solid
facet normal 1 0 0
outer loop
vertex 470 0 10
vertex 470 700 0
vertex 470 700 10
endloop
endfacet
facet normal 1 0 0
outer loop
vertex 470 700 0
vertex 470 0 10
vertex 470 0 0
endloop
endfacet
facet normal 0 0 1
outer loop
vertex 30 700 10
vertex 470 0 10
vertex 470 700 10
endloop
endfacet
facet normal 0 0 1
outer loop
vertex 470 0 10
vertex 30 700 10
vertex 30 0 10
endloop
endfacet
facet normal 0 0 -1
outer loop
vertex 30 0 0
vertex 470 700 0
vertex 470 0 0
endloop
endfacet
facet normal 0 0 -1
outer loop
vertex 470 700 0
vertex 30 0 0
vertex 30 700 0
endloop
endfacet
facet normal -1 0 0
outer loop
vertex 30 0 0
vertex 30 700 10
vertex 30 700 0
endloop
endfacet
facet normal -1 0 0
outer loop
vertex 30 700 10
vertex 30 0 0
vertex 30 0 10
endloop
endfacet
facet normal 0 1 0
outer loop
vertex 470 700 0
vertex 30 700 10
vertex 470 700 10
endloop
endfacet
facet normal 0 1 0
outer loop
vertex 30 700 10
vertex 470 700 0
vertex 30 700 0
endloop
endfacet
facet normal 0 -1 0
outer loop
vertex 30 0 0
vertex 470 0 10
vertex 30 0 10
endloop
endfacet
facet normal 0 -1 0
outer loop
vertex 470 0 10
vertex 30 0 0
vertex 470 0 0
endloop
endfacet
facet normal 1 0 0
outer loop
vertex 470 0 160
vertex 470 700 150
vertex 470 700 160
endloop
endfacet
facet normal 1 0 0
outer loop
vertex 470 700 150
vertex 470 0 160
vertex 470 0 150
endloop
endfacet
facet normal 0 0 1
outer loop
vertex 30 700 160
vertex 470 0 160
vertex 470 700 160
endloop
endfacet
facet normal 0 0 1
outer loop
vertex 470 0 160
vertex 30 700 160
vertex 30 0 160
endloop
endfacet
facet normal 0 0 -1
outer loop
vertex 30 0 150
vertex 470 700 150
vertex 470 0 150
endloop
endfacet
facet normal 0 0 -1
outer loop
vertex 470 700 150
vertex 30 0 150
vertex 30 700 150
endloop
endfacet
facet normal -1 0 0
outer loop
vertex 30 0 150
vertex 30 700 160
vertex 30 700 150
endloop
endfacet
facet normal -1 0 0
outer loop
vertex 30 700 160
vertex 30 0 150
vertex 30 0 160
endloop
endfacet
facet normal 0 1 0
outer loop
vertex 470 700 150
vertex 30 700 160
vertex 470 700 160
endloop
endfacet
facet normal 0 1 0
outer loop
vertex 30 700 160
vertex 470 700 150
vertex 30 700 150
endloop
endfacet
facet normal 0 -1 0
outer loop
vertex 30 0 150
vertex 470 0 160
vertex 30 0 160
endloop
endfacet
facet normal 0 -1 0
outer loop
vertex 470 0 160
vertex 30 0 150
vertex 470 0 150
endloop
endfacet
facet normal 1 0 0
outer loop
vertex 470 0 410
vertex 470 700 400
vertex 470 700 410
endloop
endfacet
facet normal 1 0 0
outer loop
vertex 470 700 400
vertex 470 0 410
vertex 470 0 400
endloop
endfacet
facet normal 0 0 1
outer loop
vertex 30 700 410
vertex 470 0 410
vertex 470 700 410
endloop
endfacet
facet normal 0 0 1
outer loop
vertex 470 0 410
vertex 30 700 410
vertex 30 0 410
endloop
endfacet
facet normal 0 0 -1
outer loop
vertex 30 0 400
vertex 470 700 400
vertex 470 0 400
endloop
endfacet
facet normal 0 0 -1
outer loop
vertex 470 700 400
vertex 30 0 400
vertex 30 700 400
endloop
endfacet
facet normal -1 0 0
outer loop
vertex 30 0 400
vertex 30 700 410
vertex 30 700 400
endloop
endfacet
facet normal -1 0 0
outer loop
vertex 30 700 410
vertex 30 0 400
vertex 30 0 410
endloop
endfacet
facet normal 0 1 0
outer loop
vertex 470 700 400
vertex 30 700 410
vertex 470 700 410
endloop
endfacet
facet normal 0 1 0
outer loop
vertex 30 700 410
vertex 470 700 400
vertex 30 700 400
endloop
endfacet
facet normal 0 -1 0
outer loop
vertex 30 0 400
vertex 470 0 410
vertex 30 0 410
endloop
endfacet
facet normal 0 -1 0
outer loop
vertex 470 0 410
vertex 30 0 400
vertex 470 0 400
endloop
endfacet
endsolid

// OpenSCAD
profile_width = 30;
total_width = 500;
total_depth = 700;
total_height = 600;

profile_file = "Rexroth-3 842 990 720_200MM.dxf";

module pillar(x=0, y=0, z=0, height=700){
    translate([x+profile_width/2, y+profile_width/2, z])
        linear_extrude(height)
            import(file = profile_file);
}

module shelf(height=0){
    shelf_thickness = 10;
    x = total_width - (2 * profile_width);
    y = total_depth;
    z = shelf_thickness;
    translate([profile_width,0, height])
        cube([x, y, z]);    
}

pillar();
pillar(x=total_width - profile_width);
pillar(x=total_width - profile_width, y=total_depth - profile_width);
pillar(x=0, y=total_depth - profile_width);

shelf(height = 0);
shelf(height = 150);
shelf(height = 400);
